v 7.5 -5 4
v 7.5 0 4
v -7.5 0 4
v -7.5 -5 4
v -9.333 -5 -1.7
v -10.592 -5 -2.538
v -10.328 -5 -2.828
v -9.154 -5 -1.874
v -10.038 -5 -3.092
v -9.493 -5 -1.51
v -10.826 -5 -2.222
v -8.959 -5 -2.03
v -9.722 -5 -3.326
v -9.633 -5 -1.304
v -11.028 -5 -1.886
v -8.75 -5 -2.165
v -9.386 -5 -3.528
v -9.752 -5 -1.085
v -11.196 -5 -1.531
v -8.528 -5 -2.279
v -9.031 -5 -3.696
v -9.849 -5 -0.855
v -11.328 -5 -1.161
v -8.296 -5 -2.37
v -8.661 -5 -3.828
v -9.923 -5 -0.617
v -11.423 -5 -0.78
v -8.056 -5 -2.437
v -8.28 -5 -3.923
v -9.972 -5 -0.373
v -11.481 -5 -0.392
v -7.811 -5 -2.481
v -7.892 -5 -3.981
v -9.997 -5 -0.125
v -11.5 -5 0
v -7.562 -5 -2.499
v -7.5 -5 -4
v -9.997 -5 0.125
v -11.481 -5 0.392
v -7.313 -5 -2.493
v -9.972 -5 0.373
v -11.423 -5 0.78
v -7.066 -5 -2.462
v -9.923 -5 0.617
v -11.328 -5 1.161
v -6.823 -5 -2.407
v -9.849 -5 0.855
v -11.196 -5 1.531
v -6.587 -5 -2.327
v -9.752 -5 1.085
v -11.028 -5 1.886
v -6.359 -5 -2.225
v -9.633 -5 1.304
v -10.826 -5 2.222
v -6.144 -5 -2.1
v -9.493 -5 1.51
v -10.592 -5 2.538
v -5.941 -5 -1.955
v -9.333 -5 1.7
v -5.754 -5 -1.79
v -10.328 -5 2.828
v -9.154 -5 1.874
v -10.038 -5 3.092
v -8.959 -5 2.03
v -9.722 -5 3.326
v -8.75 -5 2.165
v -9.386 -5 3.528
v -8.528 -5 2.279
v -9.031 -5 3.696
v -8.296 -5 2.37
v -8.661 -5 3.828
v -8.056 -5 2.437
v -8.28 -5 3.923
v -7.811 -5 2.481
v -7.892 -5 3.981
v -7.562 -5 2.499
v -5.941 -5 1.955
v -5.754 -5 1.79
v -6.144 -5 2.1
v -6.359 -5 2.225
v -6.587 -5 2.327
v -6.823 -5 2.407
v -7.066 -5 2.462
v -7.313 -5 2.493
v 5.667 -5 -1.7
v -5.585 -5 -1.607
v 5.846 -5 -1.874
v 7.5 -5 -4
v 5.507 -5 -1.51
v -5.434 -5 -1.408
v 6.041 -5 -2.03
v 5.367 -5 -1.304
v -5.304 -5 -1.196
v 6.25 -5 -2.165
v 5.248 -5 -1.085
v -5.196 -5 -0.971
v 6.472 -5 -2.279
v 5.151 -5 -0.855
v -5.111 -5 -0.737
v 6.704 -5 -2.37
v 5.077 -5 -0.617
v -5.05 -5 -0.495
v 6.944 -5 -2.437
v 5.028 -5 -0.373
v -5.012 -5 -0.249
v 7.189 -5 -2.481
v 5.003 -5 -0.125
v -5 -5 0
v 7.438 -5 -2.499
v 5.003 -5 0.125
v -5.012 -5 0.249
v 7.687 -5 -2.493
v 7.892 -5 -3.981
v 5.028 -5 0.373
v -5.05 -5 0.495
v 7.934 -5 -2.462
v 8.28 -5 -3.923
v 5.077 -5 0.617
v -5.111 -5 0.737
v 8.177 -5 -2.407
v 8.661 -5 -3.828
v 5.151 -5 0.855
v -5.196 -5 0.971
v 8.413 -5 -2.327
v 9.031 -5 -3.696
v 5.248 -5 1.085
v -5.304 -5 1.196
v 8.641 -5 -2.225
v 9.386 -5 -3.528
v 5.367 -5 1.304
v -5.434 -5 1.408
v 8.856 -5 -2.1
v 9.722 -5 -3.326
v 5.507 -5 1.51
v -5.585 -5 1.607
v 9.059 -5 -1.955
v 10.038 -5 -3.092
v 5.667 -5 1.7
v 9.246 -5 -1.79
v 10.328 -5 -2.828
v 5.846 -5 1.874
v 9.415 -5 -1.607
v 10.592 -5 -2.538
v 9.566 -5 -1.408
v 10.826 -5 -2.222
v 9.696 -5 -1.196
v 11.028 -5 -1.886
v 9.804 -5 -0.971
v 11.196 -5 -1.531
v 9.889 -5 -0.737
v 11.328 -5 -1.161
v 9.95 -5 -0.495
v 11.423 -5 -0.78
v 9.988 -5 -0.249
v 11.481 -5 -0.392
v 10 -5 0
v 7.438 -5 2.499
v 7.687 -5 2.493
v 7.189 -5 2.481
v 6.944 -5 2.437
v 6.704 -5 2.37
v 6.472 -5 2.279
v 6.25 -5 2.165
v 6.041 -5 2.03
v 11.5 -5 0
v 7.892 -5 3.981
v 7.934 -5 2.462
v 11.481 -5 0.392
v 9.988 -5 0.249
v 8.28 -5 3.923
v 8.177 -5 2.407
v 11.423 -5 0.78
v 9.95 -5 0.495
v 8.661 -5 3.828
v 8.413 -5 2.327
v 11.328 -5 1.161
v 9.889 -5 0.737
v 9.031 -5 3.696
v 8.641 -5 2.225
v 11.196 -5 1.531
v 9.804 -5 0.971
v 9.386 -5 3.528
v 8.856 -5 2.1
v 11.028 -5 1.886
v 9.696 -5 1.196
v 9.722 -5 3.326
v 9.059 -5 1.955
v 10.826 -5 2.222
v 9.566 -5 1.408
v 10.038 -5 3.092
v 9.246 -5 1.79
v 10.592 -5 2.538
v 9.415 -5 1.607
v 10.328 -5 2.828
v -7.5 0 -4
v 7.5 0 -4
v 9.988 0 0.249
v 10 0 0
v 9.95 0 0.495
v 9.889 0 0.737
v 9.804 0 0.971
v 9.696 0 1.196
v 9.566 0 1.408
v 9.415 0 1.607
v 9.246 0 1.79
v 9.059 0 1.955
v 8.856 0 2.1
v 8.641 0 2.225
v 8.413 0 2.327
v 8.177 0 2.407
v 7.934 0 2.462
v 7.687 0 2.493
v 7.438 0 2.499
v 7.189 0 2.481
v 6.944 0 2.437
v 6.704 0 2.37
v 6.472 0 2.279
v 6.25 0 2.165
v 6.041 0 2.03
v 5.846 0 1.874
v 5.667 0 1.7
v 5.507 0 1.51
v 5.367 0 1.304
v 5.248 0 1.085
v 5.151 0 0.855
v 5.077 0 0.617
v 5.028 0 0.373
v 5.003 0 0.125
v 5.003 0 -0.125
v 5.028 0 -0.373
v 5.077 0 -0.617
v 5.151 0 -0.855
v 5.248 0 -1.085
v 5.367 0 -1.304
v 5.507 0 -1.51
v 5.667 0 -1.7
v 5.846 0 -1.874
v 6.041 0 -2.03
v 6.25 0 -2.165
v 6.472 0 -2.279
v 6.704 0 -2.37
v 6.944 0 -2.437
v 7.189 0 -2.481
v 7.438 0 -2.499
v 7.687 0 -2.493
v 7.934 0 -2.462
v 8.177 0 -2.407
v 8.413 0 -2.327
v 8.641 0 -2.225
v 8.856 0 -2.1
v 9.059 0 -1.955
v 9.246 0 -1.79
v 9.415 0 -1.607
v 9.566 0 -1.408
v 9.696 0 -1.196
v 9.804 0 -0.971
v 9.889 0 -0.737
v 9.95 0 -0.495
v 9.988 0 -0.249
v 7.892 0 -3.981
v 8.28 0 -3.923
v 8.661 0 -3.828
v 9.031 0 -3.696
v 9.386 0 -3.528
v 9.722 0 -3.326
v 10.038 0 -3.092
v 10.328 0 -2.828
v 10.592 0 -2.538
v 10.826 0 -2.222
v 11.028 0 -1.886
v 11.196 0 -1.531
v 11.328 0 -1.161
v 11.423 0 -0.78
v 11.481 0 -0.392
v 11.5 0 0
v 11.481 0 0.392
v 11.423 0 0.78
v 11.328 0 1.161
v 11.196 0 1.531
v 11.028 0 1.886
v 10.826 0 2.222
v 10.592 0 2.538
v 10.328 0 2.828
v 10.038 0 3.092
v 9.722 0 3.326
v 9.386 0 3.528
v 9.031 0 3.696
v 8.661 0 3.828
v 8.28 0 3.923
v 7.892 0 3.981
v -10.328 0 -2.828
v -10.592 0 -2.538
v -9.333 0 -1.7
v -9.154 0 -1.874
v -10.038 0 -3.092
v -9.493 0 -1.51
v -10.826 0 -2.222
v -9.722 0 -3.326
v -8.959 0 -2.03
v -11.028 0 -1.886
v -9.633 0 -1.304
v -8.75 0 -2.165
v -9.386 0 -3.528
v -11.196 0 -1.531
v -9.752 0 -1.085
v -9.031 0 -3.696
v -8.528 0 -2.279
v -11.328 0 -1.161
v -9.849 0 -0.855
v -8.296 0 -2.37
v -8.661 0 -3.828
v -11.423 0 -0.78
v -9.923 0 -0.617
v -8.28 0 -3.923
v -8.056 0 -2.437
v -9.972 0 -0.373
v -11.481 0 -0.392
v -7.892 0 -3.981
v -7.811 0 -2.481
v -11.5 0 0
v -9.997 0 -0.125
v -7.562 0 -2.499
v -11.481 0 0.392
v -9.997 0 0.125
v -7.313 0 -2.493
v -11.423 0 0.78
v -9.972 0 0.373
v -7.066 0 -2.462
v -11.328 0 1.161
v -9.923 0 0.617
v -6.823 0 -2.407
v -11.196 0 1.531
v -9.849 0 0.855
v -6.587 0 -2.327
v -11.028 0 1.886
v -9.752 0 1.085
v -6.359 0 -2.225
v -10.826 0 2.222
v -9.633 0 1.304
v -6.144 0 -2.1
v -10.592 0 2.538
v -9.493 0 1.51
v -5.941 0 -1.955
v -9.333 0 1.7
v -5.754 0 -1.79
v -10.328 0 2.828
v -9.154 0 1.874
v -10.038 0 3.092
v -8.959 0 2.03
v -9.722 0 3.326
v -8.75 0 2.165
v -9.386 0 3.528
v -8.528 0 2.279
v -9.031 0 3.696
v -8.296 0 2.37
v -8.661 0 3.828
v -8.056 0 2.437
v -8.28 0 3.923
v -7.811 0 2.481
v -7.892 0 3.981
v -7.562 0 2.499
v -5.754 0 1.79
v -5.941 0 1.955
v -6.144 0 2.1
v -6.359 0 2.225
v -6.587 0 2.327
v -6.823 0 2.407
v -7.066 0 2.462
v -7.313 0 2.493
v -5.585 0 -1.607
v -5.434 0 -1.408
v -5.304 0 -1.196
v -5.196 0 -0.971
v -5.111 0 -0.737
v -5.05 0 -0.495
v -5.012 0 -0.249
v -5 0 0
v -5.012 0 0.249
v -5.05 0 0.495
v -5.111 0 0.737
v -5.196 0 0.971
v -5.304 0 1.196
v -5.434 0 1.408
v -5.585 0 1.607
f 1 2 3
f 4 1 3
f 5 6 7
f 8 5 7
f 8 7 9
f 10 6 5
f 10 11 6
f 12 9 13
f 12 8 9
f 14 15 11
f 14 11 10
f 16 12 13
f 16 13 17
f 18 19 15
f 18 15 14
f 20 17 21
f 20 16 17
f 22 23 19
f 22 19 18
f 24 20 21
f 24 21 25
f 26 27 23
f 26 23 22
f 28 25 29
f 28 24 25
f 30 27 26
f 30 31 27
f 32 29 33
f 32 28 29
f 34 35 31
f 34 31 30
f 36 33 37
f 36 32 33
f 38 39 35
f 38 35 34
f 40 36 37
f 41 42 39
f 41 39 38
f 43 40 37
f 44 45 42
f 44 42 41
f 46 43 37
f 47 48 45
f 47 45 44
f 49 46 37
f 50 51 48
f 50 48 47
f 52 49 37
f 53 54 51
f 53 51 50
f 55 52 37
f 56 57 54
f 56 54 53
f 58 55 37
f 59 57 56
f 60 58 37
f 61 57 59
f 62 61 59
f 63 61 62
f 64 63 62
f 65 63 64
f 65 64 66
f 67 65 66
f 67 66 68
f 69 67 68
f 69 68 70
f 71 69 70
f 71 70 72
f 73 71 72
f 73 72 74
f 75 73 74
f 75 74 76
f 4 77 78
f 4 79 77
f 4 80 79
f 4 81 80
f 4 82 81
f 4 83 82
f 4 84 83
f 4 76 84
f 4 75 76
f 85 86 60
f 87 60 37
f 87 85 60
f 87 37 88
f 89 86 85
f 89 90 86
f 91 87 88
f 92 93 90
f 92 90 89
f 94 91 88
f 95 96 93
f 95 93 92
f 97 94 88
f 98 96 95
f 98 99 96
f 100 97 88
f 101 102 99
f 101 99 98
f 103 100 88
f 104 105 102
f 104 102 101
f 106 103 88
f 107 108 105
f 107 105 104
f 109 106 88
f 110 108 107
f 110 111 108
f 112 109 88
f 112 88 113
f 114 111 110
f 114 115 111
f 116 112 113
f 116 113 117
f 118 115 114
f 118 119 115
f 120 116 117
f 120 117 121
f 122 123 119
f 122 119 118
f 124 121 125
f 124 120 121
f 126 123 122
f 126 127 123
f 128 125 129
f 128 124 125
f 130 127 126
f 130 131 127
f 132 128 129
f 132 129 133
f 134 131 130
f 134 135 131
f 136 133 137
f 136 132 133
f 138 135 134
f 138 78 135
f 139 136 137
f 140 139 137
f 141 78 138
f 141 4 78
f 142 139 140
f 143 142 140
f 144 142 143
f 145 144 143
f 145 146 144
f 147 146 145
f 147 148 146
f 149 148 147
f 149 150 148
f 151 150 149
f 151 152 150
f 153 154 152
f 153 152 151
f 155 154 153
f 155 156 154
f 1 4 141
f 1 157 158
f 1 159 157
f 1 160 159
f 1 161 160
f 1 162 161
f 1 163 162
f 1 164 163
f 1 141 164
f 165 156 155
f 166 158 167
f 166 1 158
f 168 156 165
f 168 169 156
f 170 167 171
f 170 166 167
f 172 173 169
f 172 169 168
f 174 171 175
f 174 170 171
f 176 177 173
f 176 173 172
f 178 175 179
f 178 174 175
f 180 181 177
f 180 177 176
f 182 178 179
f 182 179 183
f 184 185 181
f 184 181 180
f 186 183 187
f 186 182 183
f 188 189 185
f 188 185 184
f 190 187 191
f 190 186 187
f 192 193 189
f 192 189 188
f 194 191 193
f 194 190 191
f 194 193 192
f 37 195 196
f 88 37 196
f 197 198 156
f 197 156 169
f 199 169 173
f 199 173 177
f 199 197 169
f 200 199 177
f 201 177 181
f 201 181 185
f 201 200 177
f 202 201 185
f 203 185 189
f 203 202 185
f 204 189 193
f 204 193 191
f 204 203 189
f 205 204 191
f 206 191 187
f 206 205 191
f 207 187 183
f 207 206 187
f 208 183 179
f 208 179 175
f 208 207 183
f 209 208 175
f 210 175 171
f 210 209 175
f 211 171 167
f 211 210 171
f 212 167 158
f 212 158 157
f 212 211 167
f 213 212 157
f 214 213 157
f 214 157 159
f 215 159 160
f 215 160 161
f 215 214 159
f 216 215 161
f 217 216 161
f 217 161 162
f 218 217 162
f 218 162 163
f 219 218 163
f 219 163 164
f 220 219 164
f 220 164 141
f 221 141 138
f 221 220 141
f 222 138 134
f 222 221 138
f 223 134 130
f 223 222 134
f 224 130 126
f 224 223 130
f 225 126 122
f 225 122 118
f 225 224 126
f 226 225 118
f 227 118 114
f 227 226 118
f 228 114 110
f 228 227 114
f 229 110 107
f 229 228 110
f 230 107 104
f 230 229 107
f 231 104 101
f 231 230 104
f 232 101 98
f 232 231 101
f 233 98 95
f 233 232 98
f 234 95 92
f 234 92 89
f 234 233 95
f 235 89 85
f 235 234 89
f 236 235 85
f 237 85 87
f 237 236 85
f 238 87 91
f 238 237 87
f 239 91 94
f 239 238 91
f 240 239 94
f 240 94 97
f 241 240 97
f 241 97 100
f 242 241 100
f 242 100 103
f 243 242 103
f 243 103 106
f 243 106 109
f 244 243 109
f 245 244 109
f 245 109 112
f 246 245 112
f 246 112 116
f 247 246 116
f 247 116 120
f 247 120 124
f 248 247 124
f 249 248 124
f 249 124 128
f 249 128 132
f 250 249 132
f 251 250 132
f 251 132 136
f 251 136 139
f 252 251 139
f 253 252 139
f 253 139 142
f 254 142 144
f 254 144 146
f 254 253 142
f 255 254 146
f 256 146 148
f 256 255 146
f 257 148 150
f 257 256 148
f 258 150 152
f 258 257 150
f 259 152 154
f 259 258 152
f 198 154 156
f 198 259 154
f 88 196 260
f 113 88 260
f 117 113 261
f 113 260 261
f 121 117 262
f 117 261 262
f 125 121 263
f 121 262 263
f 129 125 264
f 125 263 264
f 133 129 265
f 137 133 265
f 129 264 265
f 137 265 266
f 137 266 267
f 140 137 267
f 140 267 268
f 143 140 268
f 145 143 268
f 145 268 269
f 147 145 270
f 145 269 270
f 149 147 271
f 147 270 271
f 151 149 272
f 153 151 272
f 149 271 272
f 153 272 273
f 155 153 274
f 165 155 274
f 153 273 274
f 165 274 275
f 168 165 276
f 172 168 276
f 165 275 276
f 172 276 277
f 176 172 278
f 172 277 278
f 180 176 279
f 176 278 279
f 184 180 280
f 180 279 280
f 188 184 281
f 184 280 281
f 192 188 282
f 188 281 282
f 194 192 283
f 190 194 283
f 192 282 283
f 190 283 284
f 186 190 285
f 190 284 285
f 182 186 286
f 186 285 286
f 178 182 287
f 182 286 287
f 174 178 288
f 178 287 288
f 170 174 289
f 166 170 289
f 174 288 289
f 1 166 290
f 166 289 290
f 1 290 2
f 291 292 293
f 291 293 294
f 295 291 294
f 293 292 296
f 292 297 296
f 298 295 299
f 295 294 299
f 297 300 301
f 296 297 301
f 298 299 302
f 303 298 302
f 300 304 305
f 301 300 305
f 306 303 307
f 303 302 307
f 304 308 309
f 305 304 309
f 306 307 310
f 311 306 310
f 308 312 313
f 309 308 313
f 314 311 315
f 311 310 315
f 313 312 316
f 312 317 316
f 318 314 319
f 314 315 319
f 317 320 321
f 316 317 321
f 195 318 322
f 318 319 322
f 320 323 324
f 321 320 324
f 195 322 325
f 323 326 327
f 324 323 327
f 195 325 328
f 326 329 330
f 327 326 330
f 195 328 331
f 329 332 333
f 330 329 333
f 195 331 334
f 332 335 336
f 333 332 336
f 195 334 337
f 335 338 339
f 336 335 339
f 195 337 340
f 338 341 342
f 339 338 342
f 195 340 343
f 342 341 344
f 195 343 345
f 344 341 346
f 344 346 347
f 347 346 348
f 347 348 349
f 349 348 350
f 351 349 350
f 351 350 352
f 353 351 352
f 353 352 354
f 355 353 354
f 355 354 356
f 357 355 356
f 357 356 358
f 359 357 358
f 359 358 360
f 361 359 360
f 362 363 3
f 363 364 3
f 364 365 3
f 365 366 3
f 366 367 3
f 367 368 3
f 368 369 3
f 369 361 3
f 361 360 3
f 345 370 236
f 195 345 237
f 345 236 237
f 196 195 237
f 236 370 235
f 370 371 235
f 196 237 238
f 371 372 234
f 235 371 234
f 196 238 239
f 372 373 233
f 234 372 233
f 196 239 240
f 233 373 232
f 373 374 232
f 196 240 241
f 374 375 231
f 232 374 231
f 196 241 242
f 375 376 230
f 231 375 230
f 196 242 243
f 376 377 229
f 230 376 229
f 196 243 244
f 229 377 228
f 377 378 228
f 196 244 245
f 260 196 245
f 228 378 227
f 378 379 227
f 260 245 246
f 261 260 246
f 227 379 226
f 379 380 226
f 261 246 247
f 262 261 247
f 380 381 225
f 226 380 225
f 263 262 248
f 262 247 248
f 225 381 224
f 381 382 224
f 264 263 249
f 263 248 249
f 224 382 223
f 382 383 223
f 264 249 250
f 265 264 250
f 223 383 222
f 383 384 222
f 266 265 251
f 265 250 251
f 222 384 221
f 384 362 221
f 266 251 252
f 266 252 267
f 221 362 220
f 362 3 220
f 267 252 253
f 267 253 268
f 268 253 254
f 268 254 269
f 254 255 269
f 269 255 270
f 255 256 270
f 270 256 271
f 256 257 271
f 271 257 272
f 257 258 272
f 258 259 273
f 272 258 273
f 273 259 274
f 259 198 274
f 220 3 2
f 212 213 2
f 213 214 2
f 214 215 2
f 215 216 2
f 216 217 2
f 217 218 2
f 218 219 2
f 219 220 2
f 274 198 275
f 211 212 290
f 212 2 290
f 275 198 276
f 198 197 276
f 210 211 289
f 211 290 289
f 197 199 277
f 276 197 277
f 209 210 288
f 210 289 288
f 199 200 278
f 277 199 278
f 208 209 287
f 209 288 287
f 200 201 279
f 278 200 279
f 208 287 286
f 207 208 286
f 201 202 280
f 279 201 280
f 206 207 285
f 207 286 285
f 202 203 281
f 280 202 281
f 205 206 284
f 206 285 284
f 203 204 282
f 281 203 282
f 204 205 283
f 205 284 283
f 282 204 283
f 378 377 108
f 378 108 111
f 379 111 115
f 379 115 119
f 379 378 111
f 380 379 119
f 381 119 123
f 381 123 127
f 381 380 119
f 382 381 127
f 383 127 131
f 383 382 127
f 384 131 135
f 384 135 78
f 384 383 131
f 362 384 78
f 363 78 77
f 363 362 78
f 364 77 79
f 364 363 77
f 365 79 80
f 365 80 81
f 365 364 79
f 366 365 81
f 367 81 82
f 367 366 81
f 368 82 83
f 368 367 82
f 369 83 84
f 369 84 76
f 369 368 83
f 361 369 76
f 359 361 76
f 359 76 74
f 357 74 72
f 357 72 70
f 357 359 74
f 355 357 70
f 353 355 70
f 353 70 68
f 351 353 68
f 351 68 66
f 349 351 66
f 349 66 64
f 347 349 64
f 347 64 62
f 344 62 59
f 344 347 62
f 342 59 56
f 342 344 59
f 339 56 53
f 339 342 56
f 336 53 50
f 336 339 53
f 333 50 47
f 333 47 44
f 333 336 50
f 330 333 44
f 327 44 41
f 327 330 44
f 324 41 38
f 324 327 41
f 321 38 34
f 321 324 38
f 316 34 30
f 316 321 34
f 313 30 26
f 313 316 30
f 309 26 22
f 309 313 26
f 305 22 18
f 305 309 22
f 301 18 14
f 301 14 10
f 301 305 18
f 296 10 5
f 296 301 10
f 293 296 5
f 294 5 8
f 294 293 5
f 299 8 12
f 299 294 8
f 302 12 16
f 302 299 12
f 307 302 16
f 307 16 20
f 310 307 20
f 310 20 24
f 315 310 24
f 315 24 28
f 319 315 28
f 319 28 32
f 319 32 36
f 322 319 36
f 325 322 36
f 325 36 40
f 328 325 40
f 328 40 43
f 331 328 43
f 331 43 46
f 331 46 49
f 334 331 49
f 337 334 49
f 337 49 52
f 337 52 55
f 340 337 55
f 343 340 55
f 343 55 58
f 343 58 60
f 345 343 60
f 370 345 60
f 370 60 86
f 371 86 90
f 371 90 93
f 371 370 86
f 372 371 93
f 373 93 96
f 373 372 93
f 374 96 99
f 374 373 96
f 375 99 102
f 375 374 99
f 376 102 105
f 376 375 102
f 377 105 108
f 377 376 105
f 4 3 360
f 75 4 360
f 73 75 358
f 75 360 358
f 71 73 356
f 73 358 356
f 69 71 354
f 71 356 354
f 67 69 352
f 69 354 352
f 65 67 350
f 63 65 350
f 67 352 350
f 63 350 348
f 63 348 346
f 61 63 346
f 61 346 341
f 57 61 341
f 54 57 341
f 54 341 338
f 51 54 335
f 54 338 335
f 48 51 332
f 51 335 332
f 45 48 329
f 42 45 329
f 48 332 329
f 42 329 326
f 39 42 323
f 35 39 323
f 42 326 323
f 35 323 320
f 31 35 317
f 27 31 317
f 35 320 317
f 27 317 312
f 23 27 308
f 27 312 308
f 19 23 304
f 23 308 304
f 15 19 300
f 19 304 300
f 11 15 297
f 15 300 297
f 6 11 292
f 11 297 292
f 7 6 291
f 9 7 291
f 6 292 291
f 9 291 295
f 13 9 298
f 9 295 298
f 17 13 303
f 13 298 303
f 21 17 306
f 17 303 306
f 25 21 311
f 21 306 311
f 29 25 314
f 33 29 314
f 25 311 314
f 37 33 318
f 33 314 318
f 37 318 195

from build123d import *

# Parameters (mm, degrees)
F0_R     = 2.5
F1_DEPTH = 5


with BuildPart() as f1:
    # F0 (on Front) → F1 (new body)
    with BuildSketch(Plane.XZ):
        with BuildLine():
            Line((0, 4), (-7.5, 4))
            ThreePointArc((-7.5, 4), (-11.5, 0), (-7.5, -4))
            Line((-7.5, -4), (0, -4))
            Line((0, -4), (0, 4))
        make_face()
        with Locations((-7.5, 0)):
            Circle(F0_R, mode=Mode.SUBTRACT)
        with BuildLine():
            Line((7.5, 4), (0, 4))
            Line((0, 4), (0, -4))
            Line((0, -4), (7.5, -4))
            ThreePointArc((7.5, -4), (11.5, 0), (7.5, 4))
        make_face()
        with Locations((7.5, 0)):
            Circle(F0_R, mode=Mode.SUBTRACT)
    extrude(amount=F1_DEPTH)


solid = f1.part
